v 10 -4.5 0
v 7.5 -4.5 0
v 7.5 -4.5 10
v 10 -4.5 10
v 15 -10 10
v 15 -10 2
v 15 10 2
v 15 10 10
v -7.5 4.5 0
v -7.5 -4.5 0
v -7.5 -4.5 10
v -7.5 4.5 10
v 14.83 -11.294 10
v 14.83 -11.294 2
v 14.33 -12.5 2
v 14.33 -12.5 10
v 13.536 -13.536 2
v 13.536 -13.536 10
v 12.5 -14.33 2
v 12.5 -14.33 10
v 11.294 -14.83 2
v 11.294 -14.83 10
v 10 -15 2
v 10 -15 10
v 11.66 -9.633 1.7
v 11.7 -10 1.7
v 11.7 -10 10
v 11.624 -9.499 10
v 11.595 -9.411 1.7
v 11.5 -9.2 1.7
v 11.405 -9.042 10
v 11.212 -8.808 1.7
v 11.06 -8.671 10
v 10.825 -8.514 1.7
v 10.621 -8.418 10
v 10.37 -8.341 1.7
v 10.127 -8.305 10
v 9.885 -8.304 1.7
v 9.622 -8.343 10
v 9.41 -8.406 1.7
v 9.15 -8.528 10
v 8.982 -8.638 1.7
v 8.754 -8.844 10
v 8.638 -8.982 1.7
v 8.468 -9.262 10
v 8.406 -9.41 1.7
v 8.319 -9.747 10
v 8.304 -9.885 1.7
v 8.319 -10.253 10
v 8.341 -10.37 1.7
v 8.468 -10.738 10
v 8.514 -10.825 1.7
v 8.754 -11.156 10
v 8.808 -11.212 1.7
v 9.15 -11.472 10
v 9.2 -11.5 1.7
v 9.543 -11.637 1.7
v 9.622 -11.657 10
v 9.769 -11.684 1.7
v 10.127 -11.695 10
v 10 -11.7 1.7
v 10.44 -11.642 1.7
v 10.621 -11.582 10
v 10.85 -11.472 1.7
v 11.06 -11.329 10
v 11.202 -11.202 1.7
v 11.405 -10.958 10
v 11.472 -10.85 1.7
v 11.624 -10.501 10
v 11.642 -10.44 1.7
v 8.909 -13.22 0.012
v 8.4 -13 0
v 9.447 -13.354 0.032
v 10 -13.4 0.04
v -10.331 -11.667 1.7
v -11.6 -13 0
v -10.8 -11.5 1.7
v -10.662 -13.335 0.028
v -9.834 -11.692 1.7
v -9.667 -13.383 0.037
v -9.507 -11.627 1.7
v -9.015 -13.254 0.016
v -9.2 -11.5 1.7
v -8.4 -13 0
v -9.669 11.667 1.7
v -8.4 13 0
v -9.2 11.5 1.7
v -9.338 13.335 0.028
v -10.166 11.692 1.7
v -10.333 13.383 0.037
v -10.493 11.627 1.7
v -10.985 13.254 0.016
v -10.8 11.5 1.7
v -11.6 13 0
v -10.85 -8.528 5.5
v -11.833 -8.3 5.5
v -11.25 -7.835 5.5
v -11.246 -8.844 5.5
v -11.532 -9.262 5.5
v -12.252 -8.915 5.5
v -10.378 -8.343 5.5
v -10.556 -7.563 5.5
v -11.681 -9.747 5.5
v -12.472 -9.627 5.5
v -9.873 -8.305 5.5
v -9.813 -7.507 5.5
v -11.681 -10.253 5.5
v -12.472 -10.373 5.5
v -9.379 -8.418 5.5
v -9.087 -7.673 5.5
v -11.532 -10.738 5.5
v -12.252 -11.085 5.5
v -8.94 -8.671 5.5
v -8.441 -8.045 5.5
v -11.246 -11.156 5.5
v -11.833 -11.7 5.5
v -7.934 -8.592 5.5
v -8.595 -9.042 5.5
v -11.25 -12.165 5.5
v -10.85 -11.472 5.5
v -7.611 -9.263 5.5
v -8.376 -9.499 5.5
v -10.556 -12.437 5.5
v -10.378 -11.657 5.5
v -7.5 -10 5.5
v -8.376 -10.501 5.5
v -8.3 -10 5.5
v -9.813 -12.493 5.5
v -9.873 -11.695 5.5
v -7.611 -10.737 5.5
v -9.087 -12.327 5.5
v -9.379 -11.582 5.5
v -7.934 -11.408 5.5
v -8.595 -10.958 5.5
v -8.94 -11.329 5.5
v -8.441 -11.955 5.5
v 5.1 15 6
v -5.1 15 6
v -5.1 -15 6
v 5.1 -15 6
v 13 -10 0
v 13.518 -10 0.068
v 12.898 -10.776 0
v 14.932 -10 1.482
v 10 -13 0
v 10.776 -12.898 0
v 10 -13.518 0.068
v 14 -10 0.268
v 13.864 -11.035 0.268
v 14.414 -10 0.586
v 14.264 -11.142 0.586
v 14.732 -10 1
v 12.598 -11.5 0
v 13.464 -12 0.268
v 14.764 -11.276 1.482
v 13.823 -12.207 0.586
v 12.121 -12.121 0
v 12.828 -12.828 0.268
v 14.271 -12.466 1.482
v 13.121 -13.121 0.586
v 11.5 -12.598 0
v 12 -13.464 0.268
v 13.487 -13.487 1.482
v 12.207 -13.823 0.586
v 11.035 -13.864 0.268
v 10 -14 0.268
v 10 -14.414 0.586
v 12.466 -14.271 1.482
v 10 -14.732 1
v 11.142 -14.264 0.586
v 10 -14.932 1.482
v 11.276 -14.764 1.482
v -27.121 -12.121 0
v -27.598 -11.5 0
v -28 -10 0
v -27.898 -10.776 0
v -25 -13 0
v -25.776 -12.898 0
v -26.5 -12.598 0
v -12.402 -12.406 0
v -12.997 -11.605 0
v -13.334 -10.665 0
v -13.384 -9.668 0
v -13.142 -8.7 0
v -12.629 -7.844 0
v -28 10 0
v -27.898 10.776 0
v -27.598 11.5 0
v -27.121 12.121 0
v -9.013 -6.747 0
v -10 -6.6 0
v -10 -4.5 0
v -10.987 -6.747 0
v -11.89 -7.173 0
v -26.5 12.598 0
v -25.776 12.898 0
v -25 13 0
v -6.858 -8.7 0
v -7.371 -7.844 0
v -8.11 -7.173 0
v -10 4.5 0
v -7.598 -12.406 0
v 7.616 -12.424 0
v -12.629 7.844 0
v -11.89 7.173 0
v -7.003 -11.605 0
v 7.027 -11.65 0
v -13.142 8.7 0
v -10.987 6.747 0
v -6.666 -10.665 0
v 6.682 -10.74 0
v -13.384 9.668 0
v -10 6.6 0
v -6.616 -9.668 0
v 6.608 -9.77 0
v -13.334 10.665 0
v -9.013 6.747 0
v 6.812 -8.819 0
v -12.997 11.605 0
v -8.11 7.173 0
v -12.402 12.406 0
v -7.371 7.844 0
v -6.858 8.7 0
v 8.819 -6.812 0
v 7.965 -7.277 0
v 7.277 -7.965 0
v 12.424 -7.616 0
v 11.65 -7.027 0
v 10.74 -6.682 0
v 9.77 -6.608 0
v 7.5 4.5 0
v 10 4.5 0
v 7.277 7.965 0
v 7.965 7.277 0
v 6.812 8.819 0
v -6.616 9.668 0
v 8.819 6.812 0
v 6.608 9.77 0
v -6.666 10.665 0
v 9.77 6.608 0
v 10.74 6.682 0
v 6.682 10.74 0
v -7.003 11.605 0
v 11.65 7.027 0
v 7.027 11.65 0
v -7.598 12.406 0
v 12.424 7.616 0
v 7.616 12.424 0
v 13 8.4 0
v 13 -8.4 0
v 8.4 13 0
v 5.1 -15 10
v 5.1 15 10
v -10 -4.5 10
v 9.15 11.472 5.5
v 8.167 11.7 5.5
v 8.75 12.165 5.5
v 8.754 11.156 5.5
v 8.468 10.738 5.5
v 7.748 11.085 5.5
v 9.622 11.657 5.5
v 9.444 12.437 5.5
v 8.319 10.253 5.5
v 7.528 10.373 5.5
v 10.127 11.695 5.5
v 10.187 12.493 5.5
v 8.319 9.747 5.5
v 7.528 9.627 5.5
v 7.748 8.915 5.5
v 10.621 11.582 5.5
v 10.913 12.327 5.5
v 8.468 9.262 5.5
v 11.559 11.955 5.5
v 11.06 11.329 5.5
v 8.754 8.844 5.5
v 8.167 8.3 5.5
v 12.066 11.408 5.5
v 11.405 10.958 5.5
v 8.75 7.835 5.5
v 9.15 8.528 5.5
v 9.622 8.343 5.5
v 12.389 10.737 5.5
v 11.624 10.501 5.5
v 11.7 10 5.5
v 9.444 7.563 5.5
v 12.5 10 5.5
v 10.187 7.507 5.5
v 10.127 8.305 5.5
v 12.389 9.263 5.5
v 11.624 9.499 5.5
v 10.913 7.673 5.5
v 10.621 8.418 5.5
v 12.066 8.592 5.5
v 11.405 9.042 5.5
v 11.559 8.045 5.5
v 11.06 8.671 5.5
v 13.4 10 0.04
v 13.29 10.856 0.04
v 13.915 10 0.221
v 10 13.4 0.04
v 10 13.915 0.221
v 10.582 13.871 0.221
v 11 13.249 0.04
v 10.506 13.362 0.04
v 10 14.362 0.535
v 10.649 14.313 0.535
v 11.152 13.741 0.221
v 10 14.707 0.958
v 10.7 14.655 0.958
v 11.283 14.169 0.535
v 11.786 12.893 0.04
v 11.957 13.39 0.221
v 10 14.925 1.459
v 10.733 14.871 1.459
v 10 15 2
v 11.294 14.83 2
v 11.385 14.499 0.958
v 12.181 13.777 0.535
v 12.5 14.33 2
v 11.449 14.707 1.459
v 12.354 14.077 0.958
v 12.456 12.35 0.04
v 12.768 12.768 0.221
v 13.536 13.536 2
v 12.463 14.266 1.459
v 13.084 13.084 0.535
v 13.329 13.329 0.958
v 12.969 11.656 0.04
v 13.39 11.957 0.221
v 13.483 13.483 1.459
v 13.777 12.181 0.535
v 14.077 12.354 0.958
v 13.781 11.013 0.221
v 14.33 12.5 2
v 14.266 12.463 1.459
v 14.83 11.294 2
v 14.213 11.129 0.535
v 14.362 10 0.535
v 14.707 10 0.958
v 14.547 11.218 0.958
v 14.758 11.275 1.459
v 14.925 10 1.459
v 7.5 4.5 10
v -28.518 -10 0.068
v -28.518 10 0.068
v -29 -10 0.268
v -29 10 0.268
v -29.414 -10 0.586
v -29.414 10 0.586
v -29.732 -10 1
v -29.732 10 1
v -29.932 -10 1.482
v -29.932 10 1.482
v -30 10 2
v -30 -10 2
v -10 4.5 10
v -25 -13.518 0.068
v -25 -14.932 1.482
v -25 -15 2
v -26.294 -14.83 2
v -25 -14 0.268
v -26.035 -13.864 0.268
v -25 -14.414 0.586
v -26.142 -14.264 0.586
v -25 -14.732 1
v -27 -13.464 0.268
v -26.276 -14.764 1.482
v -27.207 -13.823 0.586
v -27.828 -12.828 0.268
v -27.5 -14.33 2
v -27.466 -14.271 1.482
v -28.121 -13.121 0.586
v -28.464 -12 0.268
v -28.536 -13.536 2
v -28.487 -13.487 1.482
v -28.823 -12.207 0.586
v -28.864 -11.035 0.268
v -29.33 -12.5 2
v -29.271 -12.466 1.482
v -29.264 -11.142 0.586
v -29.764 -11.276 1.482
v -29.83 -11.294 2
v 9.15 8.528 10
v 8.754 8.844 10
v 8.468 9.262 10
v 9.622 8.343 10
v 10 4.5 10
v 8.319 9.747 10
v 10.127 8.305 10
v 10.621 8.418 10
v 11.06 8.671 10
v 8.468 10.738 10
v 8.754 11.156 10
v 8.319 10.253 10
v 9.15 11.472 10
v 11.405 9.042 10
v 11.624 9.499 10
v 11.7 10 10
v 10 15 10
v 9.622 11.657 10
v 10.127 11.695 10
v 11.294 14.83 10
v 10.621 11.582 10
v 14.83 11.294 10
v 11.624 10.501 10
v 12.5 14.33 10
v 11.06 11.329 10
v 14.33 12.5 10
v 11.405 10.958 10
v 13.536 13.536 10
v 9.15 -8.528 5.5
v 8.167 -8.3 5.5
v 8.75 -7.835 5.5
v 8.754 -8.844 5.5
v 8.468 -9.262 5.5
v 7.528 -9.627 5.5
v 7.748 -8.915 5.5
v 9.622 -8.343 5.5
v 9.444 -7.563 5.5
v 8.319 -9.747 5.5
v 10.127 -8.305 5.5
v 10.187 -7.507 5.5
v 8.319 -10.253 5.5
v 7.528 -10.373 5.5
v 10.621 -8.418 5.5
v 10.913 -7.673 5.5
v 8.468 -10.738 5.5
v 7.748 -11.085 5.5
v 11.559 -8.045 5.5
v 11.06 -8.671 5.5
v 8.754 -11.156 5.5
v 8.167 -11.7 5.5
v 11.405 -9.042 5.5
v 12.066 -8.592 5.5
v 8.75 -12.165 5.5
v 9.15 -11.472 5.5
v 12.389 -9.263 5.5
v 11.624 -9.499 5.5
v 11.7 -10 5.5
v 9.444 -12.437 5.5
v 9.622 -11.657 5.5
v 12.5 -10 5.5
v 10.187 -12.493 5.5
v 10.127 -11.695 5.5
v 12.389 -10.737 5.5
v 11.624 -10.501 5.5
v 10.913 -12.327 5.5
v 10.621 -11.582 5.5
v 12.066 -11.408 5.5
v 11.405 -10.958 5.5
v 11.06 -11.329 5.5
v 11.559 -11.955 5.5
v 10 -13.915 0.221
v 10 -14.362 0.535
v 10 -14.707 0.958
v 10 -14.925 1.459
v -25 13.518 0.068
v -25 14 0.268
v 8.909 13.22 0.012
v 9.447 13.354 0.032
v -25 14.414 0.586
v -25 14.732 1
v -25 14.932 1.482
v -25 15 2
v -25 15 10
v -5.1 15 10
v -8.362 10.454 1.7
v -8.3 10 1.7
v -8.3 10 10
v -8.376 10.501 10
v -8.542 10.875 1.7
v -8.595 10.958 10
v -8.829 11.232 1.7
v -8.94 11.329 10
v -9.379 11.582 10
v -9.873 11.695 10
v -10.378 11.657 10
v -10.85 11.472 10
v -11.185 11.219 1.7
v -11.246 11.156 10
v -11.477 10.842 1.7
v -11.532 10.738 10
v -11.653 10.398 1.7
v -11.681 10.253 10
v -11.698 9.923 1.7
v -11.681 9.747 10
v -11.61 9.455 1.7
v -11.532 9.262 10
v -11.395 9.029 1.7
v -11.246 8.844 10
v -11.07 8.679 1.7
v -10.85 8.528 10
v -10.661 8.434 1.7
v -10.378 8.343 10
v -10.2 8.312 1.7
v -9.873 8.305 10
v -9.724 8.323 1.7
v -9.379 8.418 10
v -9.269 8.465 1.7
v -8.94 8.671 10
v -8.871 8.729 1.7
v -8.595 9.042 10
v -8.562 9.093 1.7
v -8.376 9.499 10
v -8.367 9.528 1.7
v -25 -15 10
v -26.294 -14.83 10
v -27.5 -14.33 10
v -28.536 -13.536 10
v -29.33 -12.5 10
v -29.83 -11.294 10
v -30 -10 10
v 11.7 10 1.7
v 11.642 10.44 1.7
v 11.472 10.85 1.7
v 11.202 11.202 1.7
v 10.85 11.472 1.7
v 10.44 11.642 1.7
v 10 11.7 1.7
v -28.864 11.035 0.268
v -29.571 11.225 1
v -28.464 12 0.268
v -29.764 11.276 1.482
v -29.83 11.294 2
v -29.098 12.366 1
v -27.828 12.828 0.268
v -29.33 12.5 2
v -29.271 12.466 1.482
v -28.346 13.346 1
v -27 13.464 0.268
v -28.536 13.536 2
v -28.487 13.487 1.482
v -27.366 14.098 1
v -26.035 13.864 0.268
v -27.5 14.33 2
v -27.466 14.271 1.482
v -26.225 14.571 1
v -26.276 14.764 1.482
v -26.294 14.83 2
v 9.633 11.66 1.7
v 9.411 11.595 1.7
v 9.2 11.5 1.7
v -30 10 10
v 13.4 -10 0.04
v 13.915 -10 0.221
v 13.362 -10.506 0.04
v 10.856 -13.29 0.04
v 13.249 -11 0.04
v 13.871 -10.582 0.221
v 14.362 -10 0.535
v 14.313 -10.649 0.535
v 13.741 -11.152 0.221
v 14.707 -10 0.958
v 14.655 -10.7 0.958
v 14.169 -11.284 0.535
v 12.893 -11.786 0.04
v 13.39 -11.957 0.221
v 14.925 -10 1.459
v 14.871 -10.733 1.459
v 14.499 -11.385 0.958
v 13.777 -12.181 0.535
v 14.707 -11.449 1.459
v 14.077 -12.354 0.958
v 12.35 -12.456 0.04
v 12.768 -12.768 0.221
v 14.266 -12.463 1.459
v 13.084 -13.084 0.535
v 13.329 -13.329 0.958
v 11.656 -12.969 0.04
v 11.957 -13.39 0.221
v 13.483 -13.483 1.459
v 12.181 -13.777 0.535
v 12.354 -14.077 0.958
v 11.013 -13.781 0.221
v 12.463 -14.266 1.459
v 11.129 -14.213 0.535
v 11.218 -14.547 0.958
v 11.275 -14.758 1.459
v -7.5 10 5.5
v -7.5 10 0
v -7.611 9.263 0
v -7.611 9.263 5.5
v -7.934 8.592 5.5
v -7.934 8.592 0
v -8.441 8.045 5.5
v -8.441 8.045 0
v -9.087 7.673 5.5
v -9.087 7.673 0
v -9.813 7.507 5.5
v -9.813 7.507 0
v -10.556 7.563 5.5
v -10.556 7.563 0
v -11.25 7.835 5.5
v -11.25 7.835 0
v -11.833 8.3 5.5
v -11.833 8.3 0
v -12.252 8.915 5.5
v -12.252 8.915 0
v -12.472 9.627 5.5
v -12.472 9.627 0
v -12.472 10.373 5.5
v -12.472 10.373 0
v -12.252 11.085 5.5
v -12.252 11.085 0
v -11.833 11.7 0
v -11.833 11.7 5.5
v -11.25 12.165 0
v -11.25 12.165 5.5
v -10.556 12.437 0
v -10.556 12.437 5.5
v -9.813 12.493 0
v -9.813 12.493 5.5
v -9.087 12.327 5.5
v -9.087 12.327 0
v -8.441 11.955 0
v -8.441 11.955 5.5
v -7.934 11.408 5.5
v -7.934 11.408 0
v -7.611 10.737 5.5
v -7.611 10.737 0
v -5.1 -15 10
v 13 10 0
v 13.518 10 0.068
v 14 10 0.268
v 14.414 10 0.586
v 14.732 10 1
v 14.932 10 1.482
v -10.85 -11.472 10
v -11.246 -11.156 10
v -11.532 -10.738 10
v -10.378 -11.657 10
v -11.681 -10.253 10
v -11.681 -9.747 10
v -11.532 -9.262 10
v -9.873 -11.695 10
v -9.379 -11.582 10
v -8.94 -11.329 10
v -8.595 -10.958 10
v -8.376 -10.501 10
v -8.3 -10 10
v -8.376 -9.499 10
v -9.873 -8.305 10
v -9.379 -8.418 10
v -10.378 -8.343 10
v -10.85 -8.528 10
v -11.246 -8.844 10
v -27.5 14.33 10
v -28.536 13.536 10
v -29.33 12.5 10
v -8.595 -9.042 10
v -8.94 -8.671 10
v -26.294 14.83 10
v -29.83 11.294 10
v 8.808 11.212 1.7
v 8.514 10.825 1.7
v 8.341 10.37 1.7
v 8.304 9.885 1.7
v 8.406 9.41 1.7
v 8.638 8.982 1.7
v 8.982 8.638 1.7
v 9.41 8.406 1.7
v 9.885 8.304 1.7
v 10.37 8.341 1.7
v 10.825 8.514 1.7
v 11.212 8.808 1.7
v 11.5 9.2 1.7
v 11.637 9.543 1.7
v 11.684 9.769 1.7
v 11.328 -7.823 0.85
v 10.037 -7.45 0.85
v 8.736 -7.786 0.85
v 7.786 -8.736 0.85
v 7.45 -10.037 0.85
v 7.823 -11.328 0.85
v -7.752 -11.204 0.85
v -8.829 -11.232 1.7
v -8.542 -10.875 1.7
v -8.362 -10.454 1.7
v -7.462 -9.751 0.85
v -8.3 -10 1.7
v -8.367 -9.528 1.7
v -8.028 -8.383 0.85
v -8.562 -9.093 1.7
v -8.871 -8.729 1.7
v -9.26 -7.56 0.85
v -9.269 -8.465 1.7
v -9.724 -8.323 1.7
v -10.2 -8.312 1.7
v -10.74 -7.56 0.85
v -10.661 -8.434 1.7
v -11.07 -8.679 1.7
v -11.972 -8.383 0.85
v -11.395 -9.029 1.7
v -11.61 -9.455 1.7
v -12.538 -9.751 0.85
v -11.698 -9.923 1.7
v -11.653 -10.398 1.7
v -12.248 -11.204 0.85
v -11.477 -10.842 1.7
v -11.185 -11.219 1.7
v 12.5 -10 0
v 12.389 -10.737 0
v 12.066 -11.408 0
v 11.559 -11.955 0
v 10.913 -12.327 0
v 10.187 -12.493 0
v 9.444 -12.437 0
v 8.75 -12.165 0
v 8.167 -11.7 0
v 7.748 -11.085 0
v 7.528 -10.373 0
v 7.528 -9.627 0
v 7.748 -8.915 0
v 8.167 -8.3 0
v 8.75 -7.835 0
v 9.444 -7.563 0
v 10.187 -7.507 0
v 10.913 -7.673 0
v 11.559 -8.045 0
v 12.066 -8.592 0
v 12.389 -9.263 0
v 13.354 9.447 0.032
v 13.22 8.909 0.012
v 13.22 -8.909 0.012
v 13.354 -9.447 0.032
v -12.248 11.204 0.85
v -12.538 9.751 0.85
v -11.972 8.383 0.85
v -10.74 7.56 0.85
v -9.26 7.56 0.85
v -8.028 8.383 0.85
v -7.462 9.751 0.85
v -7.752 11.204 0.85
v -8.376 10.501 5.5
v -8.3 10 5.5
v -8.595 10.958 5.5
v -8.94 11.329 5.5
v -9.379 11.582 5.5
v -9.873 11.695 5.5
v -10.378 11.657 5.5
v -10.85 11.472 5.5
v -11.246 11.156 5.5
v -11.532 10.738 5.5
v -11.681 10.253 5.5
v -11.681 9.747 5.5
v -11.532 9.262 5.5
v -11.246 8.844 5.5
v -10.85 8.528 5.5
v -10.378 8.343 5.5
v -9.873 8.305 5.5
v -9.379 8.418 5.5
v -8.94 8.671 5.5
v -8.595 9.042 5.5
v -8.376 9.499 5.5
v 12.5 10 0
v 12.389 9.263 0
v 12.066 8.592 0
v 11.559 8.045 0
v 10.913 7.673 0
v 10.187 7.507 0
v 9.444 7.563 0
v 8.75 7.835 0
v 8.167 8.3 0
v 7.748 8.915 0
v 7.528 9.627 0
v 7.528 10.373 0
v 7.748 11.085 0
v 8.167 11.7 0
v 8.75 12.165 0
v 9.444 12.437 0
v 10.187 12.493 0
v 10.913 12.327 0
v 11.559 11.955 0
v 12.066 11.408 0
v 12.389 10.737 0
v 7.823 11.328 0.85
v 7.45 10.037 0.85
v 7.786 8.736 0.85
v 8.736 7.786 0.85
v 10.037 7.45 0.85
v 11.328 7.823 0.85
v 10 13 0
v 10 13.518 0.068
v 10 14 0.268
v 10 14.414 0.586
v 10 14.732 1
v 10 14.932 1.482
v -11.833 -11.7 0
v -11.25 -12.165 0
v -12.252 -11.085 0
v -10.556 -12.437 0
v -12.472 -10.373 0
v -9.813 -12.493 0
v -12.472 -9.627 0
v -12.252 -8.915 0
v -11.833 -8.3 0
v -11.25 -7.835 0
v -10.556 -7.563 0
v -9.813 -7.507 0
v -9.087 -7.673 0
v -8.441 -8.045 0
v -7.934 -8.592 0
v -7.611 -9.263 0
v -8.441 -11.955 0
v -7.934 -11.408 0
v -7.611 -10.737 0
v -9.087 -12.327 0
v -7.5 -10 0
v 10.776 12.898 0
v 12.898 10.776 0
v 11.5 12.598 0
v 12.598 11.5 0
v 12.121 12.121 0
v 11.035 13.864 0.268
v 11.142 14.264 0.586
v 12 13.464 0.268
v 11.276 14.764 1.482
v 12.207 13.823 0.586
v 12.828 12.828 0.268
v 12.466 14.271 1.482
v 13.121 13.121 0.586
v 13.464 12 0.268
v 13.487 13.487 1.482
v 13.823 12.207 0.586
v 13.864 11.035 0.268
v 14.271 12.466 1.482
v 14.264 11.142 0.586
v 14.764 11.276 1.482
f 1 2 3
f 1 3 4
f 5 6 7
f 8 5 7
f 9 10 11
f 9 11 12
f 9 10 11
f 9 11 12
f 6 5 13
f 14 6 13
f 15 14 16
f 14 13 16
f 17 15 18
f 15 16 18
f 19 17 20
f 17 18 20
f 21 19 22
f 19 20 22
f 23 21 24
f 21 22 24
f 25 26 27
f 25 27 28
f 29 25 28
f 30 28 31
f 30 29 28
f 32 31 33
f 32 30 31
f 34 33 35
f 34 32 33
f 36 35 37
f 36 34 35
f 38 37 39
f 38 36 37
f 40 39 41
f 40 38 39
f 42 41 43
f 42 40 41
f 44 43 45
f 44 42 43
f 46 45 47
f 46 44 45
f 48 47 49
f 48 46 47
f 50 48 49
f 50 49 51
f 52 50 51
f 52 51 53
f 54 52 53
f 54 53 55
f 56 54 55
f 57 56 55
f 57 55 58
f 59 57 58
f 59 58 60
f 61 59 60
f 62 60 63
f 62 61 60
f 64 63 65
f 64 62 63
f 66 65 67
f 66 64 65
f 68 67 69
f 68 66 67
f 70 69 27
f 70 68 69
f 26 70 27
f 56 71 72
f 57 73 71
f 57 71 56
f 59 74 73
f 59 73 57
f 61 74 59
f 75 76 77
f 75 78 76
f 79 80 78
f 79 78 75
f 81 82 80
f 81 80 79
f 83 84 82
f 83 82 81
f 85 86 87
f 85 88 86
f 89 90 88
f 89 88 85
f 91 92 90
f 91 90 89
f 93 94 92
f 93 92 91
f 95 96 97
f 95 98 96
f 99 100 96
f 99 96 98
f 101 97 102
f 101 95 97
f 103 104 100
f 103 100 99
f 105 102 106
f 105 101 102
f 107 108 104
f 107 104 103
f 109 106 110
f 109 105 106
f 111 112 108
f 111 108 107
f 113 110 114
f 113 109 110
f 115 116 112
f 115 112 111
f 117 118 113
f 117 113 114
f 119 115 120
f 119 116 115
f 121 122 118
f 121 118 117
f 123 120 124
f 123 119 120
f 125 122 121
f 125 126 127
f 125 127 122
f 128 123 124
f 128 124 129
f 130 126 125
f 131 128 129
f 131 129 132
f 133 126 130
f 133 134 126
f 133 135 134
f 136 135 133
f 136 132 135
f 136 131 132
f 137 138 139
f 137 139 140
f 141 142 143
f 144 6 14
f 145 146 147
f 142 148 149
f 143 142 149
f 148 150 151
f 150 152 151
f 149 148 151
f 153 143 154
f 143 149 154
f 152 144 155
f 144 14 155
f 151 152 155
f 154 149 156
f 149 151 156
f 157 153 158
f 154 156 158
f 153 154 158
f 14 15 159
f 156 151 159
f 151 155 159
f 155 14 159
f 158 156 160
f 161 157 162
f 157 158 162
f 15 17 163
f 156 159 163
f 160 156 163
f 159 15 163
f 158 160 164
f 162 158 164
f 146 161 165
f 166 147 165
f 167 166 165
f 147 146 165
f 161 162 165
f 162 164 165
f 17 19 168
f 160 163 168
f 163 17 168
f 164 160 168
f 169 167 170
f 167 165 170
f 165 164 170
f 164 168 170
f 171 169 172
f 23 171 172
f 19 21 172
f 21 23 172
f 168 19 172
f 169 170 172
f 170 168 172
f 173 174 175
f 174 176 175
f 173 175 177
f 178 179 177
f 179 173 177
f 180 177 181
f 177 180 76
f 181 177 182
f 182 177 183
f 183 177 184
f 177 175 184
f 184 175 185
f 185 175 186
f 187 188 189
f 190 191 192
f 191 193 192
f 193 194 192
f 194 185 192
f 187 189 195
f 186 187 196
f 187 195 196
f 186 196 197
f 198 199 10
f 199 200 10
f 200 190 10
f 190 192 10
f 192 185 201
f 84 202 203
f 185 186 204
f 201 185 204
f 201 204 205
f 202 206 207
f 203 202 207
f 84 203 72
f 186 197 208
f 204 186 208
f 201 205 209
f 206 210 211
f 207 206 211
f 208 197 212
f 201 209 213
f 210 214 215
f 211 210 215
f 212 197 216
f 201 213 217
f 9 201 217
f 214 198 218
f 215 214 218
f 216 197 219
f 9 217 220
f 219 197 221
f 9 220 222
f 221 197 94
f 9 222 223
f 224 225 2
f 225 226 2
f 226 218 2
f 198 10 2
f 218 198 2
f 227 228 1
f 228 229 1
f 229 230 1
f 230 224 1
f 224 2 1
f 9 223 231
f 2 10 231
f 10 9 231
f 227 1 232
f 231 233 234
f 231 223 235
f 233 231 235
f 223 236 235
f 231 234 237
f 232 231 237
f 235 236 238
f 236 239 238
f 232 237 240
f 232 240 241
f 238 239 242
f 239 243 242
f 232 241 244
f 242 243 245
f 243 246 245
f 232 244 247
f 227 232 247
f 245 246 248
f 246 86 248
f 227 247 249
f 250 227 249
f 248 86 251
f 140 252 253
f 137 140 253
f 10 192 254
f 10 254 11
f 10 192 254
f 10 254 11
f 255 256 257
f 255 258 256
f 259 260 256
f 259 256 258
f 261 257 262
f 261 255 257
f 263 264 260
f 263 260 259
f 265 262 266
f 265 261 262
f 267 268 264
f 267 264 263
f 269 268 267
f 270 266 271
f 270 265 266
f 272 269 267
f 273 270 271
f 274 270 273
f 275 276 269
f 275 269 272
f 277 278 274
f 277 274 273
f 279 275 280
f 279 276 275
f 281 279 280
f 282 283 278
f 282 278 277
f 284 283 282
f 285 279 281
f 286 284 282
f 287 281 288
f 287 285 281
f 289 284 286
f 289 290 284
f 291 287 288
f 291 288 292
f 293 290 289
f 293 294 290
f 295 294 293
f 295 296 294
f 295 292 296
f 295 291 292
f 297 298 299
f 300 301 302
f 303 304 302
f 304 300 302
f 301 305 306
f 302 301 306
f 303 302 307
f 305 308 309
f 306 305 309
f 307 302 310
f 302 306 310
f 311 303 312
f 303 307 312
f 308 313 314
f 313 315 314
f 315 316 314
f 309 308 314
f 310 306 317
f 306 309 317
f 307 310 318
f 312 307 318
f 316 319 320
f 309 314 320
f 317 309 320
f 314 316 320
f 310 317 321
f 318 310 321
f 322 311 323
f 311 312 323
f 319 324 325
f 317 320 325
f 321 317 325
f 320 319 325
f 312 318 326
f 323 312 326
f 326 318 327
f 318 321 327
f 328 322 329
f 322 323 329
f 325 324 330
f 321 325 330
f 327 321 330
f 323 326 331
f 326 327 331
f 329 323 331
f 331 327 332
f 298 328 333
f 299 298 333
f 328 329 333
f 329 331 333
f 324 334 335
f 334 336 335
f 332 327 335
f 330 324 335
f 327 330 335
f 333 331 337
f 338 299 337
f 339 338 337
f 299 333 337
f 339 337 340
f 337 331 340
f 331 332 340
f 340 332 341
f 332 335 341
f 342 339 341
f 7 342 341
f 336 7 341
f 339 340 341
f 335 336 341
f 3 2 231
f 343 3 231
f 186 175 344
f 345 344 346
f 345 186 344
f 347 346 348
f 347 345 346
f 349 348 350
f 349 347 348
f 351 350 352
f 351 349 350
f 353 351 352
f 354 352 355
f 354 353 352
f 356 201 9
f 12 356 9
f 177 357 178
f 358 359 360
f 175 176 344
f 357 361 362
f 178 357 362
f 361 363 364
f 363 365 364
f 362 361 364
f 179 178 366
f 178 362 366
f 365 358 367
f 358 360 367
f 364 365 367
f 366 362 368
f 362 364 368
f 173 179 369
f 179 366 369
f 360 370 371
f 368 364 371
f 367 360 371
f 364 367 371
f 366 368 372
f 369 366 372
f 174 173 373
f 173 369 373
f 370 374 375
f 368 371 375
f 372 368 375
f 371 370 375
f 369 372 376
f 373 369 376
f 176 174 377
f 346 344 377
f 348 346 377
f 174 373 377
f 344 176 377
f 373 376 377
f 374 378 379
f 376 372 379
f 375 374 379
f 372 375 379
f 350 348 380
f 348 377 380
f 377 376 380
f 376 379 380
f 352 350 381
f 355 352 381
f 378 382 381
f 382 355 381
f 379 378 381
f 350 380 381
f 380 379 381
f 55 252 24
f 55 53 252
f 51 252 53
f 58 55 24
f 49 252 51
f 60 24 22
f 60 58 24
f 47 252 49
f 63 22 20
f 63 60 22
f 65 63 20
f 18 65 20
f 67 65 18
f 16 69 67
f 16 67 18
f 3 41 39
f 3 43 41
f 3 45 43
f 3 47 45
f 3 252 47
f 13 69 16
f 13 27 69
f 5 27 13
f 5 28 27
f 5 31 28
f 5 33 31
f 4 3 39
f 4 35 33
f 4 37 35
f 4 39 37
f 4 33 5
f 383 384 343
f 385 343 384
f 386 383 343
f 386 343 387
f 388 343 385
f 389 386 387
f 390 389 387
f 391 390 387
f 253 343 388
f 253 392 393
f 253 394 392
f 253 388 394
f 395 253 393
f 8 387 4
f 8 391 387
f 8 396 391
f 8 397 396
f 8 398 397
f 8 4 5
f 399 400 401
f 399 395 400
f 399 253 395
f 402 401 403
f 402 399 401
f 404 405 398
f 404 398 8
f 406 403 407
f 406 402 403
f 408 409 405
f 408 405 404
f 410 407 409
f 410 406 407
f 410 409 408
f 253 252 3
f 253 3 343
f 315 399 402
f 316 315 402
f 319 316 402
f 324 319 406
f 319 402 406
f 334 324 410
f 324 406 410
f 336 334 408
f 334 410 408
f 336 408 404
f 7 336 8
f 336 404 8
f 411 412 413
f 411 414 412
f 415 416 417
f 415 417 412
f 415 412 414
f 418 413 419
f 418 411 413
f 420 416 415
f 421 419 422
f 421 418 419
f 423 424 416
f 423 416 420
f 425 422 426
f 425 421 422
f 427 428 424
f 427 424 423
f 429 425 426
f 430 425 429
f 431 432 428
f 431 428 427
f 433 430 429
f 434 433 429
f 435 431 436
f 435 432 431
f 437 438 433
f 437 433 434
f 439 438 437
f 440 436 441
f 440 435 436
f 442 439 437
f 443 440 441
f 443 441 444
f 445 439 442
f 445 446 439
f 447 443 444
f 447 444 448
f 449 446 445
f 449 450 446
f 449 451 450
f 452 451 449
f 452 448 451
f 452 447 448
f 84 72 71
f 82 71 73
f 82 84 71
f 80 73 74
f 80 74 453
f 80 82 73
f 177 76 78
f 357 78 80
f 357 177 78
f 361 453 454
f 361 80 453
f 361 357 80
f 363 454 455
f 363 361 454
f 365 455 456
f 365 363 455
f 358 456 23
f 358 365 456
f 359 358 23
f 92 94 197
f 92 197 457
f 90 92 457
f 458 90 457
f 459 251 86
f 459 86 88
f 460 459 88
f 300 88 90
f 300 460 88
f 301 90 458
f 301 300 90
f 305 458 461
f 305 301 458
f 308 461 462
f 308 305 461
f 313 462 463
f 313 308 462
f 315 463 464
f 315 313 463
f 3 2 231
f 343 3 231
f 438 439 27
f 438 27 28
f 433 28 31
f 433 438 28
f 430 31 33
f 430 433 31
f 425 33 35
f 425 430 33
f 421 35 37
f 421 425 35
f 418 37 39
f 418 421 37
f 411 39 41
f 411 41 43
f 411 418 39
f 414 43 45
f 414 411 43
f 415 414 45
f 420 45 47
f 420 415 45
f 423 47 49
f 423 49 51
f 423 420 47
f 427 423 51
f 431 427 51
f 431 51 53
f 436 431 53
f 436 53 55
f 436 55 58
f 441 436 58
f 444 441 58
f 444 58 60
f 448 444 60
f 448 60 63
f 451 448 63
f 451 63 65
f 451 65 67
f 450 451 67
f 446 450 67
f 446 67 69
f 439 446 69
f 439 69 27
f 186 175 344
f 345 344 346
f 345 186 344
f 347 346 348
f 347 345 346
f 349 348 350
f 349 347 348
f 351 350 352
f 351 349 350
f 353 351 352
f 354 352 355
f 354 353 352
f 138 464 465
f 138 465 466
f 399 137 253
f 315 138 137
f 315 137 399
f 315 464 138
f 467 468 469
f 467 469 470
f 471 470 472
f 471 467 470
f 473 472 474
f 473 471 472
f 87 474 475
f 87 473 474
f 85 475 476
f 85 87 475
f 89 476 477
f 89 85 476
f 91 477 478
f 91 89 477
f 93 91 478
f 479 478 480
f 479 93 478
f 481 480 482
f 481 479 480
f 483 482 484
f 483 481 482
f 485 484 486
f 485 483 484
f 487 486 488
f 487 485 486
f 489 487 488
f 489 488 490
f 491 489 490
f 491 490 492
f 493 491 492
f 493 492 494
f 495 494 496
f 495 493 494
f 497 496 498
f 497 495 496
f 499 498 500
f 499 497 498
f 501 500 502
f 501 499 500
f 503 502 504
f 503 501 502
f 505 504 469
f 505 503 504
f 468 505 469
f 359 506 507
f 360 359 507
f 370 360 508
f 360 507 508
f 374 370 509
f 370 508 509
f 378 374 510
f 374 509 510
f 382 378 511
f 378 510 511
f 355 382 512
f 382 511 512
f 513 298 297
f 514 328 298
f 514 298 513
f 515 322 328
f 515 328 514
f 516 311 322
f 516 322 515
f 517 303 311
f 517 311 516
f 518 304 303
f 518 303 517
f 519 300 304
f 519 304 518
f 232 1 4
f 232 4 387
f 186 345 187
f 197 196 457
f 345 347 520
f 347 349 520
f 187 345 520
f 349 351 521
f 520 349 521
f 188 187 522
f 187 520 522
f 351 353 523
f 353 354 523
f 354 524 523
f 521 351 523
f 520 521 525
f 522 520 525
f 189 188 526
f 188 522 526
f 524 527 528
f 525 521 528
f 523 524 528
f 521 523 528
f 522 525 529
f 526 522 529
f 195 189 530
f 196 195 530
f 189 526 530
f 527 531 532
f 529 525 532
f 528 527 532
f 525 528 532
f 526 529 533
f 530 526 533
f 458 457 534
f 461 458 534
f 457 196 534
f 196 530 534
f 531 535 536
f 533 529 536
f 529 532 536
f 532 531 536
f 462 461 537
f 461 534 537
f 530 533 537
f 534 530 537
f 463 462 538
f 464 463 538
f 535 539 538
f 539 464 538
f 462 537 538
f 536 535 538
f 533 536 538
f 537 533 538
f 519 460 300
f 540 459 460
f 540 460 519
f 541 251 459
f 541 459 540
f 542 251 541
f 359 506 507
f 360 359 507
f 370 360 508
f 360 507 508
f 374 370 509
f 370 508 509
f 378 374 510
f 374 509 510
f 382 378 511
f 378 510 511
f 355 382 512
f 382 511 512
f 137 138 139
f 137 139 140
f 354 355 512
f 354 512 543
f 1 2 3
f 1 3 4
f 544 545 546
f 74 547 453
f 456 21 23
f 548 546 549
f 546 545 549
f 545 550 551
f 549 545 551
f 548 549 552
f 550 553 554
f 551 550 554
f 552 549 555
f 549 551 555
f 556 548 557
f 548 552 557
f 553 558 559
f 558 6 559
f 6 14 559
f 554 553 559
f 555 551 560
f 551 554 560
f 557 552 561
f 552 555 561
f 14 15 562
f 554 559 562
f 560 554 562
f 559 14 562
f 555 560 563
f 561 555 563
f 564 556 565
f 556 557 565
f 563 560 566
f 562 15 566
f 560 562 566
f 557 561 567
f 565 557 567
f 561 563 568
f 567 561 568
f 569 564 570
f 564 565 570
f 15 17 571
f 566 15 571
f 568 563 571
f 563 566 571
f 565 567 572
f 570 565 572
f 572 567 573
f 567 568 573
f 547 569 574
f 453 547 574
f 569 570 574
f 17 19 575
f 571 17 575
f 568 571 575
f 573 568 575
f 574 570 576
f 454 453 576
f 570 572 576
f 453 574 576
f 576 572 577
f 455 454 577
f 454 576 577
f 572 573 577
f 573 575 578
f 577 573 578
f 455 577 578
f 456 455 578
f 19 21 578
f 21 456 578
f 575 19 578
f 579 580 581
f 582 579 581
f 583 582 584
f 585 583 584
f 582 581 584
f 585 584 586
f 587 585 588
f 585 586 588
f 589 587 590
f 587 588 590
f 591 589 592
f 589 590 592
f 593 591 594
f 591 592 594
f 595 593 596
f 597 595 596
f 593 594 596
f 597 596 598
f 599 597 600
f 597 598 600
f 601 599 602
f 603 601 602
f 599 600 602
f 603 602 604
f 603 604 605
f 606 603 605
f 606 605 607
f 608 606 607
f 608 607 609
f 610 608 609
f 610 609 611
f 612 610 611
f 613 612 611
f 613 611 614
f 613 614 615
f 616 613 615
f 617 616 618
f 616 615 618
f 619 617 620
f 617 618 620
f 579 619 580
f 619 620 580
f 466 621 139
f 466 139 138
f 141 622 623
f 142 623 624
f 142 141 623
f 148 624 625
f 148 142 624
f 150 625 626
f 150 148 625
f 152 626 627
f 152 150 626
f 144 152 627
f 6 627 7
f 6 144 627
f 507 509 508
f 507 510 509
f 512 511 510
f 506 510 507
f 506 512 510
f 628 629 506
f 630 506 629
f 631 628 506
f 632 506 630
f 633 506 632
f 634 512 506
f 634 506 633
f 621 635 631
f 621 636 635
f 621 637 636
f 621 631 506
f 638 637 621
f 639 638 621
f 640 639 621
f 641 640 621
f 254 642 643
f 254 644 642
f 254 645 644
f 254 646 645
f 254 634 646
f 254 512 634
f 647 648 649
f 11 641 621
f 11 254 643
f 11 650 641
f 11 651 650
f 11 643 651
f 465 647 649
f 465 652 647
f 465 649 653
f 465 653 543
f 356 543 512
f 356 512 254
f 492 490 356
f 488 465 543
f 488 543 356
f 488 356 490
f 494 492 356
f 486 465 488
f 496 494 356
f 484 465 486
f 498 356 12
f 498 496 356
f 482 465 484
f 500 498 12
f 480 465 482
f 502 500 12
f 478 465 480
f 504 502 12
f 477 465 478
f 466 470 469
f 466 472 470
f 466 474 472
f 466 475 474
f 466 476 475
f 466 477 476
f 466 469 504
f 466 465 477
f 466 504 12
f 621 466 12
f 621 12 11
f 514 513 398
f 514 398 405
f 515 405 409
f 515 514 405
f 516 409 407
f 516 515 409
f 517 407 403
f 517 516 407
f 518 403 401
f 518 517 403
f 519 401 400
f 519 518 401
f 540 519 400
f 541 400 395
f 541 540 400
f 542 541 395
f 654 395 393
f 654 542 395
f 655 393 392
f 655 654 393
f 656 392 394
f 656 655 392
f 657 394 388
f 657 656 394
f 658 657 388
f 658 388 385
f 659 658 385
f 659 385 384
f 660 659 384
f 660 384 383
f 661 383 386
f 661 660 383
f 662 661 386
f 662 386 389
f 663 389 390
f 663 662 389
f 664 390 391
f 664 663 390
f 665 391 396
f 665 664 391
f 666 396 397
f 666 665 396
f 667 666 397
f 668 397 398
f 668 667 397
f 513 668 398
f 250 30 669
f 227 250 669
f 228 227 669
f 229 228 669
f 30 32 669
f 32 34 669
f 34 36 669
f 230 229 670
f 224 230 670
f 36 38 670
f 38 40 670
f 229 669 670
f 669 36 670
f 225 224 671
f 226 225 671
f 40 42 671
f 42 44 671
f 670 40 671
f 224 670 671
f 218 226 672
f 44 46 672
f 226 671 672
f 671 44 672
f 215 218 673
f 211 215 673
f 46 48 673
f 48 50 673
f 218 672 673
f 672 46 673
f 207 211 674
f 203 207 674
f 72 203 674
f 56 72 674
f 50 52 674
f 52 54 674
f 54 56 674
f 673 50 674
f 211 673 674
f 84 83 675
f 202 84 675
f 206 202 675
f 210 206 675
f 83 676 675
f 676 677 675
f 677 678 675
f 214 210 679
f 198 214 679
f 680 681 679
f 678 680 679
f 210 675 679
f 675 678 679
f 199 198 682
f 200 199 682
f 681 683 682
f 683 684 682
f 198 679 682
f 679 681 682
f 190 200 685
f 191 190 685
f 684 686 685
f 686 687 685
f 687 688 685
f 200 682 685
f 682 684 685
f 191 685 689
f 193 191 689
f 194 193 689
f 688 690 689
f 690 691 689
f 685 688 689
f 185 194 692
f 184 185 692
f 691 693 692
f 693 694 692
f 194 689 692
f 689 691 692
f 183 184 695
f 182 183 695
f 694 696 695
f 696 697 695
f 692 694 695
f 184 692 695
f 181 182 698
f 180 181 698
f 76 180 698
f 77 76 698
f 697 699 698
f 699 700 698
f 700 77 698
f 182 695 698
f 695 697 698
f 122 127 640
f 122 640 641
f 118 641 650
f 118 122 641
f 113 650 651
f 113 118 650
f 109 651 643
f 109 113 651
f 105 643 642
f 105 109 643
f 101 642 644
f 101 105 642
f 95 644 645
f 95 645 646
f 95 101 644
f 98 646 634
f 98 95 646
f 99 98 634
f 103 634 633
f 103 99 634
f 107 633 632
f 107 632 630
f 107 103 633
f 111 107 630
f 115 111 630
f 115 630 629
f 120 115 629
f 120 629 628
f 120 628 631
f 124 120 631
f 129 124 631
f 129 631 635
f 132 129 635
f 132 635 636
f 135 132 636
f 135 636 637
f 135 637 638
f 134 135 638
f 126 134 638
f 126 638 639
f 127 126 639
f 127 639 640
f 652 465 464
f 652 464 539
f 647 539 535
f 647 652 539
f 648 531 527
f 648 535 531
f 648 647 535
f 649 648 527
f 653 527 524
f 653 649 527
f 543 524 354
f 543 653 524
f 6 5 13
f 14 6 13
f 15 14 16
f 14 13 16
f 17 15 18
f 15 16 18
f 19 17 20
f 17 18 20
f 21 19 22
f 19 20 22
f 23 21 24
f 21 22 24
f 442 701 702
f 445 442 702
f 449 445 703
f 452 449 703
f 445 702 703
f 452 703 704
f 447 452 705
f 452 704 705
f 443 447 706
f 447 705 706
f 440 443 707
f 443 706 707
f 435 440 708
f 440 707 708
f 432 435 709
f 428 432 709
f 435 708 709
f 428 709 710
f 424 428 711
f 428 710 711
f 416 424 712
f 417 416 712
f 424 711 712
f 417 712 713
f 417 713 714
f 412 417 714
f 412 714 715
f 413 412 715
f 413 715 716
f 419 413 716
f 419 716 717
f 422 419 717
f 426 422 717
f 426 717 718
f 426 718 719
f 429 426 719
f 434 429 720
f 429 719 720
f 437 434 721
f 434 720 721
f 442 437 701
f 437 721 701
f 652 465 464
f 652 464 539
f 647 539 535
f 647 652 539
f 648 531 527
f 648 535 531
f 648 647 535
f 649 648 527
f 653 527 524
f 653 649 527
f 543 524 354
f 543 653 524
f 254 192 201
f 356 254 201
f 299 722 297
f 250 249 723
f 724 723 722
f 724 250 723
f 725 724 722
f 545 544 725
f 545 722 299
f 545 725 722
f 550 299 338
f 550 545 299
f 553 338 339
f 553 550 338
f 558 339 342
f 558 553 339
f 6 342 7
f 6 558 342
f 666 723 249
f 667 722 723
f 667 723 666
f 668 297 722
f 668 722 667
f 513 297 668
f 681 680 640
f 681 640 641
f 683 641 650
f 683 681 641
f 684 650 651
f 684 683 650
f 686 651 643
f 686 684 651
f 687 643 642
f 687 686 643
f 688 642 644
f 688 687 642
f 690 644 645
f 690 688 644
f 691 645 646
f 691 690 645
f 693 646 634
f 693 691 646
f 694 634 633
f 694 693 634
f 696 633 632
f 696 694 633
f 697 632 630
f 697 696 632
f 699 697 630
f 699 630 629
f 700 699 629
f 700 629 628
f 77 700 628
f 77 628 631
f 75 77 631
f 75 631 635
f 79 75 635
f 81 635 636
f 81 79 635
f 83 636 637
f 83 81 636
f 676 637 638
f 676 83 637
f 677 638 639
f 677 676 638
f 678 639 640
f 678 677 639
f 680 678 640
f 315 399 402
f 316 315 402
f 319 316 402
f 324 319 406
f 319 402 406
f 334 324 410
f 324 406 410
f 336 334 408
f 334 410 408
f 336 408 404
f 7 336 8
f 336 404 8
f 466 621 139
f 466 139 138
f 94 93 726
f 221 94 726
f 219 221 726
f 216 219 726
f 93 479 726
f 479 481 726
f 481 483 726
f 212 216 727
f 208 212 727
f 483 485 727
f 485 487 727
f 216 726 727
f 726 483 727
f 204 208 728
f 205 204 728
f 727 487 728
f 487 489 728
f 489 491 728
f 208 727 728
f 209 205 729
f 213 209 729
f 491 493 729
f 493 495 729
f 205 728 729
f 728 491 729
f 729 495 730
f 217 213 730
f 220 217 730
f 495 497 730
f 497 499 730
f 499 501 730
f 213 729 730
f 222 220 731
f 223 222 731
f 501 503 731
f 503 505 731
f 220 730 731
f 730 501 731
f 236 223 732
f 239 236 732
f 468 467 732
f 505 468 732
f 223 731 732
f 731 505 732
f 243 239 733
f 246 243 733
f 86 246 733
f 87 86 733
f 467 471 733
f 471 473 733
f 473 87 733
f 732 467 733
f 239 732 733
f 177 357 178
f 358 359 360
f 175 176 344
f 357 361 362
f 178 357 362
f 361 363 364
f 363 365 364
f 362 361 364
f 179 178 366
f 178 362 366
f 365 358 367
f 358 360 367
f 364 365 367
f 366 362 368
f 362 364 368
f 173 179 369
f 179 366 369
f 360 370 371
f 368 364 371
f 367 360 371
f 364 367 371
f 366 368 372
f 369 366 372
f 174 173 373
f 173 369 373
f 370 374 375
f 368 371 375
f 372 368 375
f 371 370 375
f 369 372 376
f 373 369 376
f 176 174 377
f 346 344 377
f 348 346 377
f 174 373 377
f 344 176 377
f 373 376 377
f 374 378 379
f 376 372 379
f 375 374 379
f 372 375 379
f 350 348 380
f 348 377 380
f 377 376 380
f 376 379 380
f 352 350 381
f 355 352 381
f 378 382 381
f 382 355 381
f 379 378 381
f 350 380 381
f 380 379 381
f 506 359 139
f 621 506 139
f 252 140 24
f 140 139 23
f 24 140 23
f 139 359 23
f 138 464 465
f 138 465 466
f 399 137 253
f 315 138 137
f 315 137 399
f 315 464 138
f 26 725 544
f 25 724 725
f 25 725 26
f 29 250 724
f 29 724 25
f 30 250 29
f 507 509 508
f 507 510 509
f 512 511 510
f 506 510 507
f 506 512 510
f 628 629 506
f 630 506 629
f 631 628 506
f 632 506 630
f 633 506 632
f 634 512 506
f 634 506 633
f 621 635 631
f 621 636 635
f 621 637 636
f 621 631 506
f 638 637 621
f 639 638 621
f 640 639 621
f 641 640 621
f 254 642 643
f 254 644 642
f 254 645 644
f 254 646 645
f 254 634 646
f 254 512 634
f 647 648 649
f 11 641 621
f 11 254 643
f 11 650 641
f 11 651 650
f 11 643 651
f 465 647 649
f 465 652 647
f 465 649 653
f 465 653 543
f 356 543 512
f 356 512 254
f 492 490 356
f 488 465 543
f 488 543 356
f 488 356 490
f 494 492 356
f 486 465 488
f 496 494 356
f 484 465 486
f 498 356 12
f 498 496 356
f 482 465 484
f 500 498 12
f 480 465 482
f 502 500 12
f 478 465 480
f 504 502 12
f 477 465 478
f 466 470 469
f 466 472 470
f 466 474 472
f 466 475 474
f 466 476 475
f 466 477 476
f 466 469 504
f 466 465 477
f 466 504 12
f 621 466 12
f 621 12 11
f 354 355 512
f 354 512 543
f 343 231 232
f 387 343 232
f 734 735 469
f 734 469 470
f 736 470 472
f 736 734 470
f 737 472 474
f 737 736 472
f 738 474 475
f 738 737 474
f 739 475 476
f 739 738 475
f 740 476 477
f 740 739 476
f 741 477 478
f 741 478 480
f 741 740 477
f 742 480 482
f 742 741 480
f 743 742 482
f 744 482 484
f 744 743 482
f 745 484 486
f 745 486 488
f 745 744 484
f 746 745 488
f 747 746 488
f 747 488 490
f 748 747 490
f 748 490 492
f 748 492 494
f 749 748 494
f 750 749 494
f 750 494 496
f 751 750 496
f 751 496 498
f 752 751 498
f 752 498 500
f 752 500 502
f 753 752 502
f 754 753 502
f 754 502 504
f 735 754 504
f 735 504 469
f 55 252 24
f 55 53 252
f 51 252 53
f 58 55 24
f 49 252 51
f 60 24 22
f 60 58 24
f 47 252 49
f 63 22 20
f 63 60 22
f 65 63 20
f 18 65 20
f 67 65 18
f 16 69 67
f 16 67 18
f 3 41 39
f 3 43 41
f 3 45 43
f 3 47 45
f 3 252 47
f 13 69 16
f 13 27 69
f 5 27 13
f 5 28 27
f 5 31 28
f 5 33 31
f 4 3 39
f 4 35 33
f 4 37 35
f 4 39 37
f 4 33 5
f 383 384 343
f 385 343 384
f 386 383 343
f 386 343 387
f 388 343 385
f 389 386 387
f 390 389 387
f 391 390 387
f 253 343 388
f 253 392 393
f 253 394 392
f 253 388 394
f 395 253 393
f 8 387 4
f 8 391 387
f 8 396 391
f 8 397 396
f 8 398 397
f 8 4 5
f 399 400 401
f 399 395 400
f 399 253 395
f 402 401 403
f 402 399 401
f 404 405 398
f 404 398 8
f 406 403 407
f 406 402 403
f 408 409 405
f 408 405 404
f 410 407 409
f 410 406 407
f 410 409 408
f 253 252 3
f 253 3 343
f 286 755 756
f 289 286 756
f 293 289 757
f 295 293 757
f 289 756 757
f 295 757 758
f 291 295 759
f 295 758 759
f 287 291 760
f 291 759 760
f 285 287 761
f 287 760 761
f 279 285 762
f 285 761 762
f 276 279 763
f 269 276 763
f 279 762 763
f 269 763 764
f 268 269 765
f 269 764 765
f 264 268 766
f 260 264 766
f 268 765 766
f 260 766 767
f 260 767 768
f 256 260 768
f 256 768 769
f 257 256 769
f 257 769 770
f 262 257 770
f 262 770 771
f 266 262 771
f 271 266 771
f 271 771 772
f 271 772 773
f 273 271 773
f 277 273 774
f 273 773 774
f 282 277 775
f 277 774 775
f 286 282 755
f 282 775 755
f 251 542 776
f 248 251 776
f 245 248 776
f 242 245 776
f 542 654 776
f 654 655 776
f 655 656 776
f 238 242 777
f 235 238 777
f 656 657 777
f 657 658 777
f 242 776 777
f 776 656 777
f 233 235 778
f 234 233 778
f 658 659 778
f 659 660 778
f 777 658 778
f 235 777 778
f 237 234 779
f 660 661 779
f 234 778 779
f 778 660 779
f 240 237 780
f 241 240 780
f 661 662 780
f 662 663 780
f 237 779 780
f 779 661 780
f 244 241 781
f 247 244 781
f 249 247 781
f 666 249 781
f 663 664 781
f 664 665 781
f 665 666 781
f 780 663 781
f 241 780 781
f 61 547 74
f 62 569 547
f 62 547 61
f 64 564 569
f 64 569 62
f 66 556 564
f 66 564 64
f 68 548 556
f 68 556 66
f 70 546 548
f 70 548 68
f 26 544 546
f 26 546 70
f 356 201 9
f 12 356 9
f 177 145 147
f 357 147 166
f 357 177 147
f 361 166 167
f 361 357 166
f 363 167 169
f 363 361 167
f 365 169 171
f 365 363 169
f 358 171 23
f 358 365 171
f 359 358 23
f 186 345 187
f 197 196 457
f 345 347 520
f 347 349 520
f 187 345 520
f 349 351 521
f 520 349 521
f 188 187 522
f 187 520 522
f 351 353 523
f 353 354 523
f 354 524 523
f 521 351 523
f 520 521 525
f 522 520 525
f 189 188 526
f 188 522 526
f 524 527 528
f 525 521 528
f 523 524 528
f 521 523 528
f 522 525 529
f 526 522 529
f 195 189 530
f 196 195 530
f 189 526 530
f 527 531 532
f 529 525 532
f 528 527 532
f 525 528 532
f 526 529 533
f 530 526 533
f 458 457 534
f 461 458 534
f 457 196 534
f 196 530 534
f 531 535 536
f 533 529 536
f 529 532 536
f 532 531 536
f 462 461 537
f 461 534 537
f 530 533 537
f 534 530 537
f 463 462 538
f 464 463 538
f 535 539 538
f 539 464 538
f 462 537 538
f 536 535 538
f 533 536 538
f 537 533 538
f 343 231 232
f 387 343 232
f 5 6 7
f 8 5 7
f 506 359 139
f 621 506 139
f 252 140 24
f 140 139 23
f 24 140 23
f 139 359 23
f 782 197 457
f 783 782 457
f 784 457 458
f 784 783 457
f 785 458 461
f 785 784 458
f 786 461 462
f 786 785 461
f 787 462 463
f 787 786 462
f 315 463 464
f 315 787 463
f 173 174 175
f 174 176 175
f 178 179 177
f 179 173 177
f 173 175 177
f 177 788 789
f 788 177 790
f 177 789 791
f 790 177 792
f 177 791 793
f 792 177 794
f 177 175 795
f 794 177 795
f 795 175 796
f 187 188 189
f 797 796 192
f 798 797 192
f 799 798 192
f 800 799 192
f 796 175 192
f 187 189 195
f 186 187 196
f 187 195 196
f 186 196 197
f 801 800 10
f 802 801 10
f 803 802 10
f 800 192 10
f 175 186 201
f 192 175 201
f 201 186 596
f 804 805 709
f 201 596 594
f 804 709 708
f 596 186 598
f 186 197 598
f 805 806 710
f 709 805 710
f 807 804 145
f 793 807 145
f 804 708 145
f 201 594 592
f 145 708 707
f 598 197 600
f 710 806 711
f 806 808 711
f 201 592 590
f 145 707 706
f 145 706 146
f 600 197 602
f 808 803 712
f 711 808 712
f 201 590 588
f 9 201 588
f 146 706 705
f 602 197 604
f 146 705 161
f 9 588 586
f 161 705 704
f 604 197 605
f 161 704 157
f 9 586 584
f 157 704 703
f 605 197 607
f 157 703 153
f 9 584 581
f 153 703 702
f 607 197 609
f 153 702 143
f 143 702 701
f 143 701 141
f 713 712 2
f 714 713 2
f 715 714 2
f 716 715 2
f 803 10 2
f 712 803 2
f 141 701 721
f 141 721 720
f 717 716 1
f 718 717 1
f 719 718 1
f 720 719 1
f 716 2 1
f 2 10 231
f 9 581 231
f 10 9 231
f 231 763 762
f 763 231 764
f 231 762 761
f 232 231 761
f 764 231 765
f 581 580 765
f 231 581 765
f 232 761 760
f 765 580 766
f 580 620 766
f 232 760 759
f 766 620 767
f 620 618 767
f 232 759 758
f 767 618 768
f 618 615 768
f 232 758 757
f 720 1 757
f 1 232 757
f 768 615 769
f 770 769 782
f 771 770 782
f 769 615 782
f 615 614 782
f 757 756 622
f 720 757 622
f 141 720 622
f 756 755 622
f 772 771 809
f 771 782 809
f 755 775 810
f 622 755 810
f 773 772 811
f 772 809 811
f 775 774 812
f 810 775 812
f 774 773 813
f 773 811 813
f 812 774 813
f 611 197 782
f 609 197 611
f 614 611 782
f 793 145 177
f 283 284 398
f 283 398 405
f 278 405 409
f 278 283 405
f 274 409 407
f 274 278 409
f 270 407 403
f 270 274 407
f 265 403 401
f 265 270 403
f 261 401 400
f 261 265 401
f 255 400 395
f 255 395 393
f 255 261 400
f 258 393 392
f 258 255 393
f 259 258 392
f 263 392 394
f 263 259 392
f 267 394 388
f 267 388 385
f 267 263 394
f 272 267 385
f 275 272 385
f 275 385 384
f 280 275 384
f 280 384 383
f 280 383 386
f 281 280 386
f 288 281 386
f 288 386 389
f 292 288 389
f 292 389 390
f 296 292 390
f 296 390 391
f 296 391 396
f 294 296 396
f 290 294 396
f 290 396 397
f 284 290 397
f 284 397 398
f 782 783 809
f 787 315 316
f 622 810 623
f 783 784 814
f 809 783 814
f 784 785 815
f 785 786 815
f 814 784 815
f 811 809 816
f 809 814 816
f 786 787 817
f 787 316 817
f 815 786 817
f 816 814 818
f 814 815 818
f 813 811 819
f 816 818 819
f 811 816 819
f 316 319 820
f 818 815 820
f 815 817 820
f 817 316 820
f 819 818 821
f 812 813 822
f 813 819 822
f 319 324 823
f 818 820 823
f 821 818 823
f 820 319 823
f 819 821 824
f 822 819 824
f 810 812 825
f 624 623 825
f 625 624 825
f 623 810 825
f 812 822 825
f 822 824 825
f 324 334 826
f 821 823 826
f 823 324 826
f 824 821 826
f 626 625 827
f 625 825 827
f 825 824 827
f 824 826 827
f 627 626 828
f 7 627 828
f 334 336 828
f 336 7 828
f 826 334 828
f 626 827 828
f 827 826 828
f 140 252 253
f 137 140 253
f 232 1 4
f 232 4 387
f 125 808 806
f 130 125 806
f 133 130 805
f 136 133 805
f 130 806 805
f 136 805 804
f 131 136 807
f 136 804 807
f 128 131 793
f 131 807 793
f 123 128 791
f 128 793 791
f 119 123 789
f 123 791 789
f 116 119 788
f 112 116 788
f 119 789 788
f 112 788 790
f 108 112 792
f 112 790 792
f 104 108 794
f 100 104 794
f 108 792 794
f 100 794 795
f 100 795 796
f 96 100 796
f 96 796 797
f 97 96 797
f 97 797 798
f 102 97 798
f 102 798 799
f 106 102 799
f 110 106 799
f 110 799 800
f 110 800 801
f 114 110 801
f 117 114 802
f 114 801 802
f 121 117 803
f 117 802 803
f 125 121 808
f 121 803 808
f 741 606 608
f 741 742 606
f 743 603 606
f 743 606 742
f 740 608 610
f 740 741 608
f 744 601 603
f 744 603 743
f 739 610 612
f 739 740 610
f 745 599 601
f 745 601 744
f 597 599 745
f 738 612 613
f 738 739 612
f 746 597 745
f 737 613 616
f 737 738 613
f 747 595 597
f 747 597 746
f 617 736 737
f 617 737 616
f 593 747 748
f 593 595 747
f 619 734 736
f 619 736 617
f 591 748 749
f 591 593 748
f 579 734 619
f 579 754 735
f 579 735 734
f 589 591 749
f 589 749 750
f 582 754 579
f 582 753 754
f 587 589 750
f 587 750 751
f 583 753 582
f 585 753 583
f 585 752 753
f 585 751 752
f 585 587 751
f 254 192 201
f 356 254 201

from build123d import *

# Parameters (mm, degrees)
SKETCH_W        = 45
SKETCH_H        = 30
SKETCH_R        = 1.7
SKETCH_W_2      = 2.5
SKETCH_H_2      = 9
PAD_DEPTH       = 10
SKETCH001_W     = 10.2
SKETCH001_H     = 30
POCKET_DEPTH    = 4
FILLET_R        = 5
FILLET001_R     = 5
FILLET002_R     = 5
FILLET003_R     = 5
FILLET004_R     = 2
CHAMFER_SIZE    = 1.7
CHAMFER001_SIZE = 1.7
CHAMFER002_SIZE = 1.7
CHAMFER003_SIZE = 1.7
SKETCH002_R     = 2.5
POCKET001_DEPTH = 5.5


with BuildPart() as finalab:
    # Sketch → Pad (new body)
    with BuildSketch(Plane.XY):
        with Locations((-7.5, 0)):
            Rectangle(SKETCH_W, SKETCH_H)
        with Locations((-10, 10)):
            Circle(SKETCH_R, mode=Mode.SUBTRACT)
        with Locations((-10, -10)):
            Circle(SKETCH_R, mode=Mode.SUBTRACT)
        with Locations((10, 10)):
            Circle(SKETCH_R, mode=Mode.SUBTRACT)
        with Locations((10, -10)):
            Circle(SKETCH_R, mode=Mode.SUBTRACT)
        with Locations((-8.75, 0)):
            Rectangle(SKETCH_W_2, SKETCH_H_2, mode=Mode.SUBTRACT)
        with Locations((8.75, 0)):
            Rectangle(SKETCH_W_2, SKETCH_H_2, mode=Mode.SUBTRACT)
    extrude(amount=PAD_DEPTH)

    # Sketch001 → Pocket (cut)
    with BuildSketch(Plane.XY.offset(10)):
        Rectangle(SKETCH001_W, SKETCH001_H)
    extrude(amount=-POCKET_DEPTH, mode=Mode.SUBTRACT)

    # Fillet
    fillet_edges = [finalab.edges().sort_by_distance(p)[0] for p in [
        (15, 15, 5),
    ]]
    fillet(fillet_edges, radius=FILLET_R)

    # Fillet001
    fillet001_edges = [finalab.edges().sort_by_distance(p)[0] for p in [
        (-30, 15, 5),
    ]]
    fillet(fillet001_edges, radius=FILLET001_R)

    # Fillet002
    fillet002_edges = [finalab.edges().sort_by_distance(p)[0] for p in [
        (15, -15, 5),
    ]]
    fillet(fillet002_edges, radius=FILLET002_R)

    # Fillet003
    fillet003_edges = [finalab.edges().sort_by_distance(p)[0] for p in [
        (-30, -15, 5),
    ]]
    fillet(fillet003_edges, radius=FILLET003_R)

    # Fillet004
    fillet004_edges = [finalab.edges().sort_by_distance(p)[0] for p in [
        (-7.5, 15, 0),
    ]]
    fillet(fillet004_edges, radius=FILLET004_R)


with BuildPart() as finala:
    # Chamfer base: copy of FinalAB
    add(finalab.part)

    # Chamfer
    chamfer_edges = [finala.edges().sort_by_distance(p)[0] for p in [
        (8.3, -10, 0),
    ]]
    chamfer(chamfer_edges, length=CHAMFER_SIZE)

    # Chamfer001
    chamfer001_edges = [finala.edges().sort_by_distance(p)[0] for p in [
        (8.3, 10, 0),
    ]]
    chamfer(chamfer001_edges, length=CHAMFER001_SIZE)

    # Chamfer002
    chamfer002_edges = [finala.edges().sort_by_distance(p)[0] for p in [
        (-11.7, -10, 0),
    ]]
    chamfer(chamfer002_edges, length=CHAMFER002_SIZE)

    # Chamfer003
    chamfer003_edges = [finala.edges().sort_by_distance(p)[0] for p in [
        (-11.7, 10, 0),
    ]]
    chamfer(chamfer003_edges, length=CHAMFER003_SIZE)


with BuildPart() as finalb:
    # Pocket001 base: copy of FinalAB
    add(finalab.part)

    # Sketch002 → Pocket001 (cut)
    with BuildSketch(Plane(origin=(0, 0, 0), x_dir=(1, 0, 0), z_dir=(0, 0, -1))):
        with Locations((-10, 10)):
            Circle(SKETCH002_R)
        with Locations((10, 10)):
            Circle(SKETCH002_R)
        with Locations((10, -10)):
            Circle(SKETCH002_R)
        with Locations((-10, -10)):
            Circle(SKETCH002_R)
    extrude(amount=-POCKET001_DEPTH, mode=Mode.SUBTRACT)


solid = Compound([finala.part, finalb.part])
